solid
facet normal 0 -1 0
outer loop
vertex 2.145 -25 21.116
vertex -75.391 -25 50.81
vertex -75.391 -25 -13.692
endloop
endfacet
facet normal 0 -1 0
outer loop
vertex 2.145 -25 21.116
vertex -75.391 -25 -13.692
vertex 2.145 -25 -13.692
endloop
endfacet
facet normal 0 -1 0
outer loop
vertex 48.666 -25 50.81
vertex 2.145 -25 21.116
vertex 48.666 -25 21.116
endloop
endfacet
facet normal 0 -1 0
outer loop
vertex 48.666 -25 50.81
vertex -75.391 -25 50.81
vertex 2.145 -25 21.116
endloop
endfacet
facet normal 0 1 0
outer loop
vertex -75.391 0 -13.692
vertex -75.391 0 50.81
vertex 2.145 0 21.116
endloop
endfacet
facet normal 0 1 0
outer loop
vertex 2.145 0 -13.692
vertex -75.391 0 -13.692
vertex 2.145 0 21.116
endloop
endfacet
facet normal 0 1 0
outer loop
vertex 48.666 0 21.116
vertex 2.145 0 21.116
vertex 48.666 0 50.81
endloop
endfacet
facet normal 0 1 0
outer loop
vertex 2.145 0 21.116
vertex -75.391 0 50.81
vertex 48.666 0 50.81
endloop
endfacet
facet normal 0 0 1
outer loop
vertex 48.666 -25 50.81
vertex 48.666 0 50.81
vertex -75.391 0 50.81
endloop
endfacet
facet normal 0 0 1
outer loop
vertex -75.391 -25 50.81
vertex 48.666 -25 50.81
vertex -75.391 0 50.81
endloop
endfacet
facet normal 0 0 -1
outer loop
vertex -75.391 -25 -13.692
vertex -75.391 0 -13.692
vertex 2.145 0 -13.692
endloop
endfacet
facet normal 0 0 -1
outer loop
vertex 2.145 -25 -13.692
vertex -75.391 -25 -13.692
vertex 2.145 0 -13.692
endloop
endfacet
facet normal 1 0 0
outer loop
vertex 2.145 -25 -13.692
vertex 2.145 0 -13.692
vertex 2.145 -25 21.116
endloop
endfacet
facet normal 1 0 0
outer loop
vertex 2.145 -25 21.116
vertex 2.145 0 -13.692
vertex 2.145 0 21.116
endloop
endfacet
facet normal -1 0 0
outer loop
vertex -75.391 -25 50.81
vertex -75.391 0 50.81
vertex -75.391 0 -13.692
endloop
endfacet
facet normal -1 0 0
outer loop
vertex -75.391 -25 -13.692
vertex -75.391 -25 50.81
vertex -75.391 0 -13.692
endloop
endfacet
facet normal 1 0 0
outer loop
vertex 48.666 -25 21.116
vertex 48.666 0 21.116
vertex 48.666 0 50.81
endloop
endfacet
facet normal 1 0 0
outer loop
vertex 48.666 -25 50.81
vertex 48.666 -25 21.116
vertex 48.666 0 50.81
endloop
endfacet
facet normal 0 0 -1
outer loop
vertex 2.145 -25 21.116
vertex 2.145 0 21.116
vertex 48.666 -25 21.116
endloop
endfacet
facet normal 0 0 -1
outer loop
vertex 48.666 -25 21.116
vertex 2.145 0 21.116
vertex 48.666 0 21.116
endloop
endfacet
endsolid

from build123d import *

# Parameters (mm, degrees)
F1_DEPTH = 25


with BuildPart() as f1:
    # F0 (on Front) → F1 (new body)
    with BuildSketch(Plane.XZ):
        Polygon((2.144598, 50.810475), (-75.390868, 50.810475), (-75.390868, -13.692434), (2.144598, -13.692434), (2.144598, 21.116043), (48.665877, 21.116043), (48.665877, 50.810475), align=None)
    extrude(amount=F1_DEPTH)


solid = f1.part
